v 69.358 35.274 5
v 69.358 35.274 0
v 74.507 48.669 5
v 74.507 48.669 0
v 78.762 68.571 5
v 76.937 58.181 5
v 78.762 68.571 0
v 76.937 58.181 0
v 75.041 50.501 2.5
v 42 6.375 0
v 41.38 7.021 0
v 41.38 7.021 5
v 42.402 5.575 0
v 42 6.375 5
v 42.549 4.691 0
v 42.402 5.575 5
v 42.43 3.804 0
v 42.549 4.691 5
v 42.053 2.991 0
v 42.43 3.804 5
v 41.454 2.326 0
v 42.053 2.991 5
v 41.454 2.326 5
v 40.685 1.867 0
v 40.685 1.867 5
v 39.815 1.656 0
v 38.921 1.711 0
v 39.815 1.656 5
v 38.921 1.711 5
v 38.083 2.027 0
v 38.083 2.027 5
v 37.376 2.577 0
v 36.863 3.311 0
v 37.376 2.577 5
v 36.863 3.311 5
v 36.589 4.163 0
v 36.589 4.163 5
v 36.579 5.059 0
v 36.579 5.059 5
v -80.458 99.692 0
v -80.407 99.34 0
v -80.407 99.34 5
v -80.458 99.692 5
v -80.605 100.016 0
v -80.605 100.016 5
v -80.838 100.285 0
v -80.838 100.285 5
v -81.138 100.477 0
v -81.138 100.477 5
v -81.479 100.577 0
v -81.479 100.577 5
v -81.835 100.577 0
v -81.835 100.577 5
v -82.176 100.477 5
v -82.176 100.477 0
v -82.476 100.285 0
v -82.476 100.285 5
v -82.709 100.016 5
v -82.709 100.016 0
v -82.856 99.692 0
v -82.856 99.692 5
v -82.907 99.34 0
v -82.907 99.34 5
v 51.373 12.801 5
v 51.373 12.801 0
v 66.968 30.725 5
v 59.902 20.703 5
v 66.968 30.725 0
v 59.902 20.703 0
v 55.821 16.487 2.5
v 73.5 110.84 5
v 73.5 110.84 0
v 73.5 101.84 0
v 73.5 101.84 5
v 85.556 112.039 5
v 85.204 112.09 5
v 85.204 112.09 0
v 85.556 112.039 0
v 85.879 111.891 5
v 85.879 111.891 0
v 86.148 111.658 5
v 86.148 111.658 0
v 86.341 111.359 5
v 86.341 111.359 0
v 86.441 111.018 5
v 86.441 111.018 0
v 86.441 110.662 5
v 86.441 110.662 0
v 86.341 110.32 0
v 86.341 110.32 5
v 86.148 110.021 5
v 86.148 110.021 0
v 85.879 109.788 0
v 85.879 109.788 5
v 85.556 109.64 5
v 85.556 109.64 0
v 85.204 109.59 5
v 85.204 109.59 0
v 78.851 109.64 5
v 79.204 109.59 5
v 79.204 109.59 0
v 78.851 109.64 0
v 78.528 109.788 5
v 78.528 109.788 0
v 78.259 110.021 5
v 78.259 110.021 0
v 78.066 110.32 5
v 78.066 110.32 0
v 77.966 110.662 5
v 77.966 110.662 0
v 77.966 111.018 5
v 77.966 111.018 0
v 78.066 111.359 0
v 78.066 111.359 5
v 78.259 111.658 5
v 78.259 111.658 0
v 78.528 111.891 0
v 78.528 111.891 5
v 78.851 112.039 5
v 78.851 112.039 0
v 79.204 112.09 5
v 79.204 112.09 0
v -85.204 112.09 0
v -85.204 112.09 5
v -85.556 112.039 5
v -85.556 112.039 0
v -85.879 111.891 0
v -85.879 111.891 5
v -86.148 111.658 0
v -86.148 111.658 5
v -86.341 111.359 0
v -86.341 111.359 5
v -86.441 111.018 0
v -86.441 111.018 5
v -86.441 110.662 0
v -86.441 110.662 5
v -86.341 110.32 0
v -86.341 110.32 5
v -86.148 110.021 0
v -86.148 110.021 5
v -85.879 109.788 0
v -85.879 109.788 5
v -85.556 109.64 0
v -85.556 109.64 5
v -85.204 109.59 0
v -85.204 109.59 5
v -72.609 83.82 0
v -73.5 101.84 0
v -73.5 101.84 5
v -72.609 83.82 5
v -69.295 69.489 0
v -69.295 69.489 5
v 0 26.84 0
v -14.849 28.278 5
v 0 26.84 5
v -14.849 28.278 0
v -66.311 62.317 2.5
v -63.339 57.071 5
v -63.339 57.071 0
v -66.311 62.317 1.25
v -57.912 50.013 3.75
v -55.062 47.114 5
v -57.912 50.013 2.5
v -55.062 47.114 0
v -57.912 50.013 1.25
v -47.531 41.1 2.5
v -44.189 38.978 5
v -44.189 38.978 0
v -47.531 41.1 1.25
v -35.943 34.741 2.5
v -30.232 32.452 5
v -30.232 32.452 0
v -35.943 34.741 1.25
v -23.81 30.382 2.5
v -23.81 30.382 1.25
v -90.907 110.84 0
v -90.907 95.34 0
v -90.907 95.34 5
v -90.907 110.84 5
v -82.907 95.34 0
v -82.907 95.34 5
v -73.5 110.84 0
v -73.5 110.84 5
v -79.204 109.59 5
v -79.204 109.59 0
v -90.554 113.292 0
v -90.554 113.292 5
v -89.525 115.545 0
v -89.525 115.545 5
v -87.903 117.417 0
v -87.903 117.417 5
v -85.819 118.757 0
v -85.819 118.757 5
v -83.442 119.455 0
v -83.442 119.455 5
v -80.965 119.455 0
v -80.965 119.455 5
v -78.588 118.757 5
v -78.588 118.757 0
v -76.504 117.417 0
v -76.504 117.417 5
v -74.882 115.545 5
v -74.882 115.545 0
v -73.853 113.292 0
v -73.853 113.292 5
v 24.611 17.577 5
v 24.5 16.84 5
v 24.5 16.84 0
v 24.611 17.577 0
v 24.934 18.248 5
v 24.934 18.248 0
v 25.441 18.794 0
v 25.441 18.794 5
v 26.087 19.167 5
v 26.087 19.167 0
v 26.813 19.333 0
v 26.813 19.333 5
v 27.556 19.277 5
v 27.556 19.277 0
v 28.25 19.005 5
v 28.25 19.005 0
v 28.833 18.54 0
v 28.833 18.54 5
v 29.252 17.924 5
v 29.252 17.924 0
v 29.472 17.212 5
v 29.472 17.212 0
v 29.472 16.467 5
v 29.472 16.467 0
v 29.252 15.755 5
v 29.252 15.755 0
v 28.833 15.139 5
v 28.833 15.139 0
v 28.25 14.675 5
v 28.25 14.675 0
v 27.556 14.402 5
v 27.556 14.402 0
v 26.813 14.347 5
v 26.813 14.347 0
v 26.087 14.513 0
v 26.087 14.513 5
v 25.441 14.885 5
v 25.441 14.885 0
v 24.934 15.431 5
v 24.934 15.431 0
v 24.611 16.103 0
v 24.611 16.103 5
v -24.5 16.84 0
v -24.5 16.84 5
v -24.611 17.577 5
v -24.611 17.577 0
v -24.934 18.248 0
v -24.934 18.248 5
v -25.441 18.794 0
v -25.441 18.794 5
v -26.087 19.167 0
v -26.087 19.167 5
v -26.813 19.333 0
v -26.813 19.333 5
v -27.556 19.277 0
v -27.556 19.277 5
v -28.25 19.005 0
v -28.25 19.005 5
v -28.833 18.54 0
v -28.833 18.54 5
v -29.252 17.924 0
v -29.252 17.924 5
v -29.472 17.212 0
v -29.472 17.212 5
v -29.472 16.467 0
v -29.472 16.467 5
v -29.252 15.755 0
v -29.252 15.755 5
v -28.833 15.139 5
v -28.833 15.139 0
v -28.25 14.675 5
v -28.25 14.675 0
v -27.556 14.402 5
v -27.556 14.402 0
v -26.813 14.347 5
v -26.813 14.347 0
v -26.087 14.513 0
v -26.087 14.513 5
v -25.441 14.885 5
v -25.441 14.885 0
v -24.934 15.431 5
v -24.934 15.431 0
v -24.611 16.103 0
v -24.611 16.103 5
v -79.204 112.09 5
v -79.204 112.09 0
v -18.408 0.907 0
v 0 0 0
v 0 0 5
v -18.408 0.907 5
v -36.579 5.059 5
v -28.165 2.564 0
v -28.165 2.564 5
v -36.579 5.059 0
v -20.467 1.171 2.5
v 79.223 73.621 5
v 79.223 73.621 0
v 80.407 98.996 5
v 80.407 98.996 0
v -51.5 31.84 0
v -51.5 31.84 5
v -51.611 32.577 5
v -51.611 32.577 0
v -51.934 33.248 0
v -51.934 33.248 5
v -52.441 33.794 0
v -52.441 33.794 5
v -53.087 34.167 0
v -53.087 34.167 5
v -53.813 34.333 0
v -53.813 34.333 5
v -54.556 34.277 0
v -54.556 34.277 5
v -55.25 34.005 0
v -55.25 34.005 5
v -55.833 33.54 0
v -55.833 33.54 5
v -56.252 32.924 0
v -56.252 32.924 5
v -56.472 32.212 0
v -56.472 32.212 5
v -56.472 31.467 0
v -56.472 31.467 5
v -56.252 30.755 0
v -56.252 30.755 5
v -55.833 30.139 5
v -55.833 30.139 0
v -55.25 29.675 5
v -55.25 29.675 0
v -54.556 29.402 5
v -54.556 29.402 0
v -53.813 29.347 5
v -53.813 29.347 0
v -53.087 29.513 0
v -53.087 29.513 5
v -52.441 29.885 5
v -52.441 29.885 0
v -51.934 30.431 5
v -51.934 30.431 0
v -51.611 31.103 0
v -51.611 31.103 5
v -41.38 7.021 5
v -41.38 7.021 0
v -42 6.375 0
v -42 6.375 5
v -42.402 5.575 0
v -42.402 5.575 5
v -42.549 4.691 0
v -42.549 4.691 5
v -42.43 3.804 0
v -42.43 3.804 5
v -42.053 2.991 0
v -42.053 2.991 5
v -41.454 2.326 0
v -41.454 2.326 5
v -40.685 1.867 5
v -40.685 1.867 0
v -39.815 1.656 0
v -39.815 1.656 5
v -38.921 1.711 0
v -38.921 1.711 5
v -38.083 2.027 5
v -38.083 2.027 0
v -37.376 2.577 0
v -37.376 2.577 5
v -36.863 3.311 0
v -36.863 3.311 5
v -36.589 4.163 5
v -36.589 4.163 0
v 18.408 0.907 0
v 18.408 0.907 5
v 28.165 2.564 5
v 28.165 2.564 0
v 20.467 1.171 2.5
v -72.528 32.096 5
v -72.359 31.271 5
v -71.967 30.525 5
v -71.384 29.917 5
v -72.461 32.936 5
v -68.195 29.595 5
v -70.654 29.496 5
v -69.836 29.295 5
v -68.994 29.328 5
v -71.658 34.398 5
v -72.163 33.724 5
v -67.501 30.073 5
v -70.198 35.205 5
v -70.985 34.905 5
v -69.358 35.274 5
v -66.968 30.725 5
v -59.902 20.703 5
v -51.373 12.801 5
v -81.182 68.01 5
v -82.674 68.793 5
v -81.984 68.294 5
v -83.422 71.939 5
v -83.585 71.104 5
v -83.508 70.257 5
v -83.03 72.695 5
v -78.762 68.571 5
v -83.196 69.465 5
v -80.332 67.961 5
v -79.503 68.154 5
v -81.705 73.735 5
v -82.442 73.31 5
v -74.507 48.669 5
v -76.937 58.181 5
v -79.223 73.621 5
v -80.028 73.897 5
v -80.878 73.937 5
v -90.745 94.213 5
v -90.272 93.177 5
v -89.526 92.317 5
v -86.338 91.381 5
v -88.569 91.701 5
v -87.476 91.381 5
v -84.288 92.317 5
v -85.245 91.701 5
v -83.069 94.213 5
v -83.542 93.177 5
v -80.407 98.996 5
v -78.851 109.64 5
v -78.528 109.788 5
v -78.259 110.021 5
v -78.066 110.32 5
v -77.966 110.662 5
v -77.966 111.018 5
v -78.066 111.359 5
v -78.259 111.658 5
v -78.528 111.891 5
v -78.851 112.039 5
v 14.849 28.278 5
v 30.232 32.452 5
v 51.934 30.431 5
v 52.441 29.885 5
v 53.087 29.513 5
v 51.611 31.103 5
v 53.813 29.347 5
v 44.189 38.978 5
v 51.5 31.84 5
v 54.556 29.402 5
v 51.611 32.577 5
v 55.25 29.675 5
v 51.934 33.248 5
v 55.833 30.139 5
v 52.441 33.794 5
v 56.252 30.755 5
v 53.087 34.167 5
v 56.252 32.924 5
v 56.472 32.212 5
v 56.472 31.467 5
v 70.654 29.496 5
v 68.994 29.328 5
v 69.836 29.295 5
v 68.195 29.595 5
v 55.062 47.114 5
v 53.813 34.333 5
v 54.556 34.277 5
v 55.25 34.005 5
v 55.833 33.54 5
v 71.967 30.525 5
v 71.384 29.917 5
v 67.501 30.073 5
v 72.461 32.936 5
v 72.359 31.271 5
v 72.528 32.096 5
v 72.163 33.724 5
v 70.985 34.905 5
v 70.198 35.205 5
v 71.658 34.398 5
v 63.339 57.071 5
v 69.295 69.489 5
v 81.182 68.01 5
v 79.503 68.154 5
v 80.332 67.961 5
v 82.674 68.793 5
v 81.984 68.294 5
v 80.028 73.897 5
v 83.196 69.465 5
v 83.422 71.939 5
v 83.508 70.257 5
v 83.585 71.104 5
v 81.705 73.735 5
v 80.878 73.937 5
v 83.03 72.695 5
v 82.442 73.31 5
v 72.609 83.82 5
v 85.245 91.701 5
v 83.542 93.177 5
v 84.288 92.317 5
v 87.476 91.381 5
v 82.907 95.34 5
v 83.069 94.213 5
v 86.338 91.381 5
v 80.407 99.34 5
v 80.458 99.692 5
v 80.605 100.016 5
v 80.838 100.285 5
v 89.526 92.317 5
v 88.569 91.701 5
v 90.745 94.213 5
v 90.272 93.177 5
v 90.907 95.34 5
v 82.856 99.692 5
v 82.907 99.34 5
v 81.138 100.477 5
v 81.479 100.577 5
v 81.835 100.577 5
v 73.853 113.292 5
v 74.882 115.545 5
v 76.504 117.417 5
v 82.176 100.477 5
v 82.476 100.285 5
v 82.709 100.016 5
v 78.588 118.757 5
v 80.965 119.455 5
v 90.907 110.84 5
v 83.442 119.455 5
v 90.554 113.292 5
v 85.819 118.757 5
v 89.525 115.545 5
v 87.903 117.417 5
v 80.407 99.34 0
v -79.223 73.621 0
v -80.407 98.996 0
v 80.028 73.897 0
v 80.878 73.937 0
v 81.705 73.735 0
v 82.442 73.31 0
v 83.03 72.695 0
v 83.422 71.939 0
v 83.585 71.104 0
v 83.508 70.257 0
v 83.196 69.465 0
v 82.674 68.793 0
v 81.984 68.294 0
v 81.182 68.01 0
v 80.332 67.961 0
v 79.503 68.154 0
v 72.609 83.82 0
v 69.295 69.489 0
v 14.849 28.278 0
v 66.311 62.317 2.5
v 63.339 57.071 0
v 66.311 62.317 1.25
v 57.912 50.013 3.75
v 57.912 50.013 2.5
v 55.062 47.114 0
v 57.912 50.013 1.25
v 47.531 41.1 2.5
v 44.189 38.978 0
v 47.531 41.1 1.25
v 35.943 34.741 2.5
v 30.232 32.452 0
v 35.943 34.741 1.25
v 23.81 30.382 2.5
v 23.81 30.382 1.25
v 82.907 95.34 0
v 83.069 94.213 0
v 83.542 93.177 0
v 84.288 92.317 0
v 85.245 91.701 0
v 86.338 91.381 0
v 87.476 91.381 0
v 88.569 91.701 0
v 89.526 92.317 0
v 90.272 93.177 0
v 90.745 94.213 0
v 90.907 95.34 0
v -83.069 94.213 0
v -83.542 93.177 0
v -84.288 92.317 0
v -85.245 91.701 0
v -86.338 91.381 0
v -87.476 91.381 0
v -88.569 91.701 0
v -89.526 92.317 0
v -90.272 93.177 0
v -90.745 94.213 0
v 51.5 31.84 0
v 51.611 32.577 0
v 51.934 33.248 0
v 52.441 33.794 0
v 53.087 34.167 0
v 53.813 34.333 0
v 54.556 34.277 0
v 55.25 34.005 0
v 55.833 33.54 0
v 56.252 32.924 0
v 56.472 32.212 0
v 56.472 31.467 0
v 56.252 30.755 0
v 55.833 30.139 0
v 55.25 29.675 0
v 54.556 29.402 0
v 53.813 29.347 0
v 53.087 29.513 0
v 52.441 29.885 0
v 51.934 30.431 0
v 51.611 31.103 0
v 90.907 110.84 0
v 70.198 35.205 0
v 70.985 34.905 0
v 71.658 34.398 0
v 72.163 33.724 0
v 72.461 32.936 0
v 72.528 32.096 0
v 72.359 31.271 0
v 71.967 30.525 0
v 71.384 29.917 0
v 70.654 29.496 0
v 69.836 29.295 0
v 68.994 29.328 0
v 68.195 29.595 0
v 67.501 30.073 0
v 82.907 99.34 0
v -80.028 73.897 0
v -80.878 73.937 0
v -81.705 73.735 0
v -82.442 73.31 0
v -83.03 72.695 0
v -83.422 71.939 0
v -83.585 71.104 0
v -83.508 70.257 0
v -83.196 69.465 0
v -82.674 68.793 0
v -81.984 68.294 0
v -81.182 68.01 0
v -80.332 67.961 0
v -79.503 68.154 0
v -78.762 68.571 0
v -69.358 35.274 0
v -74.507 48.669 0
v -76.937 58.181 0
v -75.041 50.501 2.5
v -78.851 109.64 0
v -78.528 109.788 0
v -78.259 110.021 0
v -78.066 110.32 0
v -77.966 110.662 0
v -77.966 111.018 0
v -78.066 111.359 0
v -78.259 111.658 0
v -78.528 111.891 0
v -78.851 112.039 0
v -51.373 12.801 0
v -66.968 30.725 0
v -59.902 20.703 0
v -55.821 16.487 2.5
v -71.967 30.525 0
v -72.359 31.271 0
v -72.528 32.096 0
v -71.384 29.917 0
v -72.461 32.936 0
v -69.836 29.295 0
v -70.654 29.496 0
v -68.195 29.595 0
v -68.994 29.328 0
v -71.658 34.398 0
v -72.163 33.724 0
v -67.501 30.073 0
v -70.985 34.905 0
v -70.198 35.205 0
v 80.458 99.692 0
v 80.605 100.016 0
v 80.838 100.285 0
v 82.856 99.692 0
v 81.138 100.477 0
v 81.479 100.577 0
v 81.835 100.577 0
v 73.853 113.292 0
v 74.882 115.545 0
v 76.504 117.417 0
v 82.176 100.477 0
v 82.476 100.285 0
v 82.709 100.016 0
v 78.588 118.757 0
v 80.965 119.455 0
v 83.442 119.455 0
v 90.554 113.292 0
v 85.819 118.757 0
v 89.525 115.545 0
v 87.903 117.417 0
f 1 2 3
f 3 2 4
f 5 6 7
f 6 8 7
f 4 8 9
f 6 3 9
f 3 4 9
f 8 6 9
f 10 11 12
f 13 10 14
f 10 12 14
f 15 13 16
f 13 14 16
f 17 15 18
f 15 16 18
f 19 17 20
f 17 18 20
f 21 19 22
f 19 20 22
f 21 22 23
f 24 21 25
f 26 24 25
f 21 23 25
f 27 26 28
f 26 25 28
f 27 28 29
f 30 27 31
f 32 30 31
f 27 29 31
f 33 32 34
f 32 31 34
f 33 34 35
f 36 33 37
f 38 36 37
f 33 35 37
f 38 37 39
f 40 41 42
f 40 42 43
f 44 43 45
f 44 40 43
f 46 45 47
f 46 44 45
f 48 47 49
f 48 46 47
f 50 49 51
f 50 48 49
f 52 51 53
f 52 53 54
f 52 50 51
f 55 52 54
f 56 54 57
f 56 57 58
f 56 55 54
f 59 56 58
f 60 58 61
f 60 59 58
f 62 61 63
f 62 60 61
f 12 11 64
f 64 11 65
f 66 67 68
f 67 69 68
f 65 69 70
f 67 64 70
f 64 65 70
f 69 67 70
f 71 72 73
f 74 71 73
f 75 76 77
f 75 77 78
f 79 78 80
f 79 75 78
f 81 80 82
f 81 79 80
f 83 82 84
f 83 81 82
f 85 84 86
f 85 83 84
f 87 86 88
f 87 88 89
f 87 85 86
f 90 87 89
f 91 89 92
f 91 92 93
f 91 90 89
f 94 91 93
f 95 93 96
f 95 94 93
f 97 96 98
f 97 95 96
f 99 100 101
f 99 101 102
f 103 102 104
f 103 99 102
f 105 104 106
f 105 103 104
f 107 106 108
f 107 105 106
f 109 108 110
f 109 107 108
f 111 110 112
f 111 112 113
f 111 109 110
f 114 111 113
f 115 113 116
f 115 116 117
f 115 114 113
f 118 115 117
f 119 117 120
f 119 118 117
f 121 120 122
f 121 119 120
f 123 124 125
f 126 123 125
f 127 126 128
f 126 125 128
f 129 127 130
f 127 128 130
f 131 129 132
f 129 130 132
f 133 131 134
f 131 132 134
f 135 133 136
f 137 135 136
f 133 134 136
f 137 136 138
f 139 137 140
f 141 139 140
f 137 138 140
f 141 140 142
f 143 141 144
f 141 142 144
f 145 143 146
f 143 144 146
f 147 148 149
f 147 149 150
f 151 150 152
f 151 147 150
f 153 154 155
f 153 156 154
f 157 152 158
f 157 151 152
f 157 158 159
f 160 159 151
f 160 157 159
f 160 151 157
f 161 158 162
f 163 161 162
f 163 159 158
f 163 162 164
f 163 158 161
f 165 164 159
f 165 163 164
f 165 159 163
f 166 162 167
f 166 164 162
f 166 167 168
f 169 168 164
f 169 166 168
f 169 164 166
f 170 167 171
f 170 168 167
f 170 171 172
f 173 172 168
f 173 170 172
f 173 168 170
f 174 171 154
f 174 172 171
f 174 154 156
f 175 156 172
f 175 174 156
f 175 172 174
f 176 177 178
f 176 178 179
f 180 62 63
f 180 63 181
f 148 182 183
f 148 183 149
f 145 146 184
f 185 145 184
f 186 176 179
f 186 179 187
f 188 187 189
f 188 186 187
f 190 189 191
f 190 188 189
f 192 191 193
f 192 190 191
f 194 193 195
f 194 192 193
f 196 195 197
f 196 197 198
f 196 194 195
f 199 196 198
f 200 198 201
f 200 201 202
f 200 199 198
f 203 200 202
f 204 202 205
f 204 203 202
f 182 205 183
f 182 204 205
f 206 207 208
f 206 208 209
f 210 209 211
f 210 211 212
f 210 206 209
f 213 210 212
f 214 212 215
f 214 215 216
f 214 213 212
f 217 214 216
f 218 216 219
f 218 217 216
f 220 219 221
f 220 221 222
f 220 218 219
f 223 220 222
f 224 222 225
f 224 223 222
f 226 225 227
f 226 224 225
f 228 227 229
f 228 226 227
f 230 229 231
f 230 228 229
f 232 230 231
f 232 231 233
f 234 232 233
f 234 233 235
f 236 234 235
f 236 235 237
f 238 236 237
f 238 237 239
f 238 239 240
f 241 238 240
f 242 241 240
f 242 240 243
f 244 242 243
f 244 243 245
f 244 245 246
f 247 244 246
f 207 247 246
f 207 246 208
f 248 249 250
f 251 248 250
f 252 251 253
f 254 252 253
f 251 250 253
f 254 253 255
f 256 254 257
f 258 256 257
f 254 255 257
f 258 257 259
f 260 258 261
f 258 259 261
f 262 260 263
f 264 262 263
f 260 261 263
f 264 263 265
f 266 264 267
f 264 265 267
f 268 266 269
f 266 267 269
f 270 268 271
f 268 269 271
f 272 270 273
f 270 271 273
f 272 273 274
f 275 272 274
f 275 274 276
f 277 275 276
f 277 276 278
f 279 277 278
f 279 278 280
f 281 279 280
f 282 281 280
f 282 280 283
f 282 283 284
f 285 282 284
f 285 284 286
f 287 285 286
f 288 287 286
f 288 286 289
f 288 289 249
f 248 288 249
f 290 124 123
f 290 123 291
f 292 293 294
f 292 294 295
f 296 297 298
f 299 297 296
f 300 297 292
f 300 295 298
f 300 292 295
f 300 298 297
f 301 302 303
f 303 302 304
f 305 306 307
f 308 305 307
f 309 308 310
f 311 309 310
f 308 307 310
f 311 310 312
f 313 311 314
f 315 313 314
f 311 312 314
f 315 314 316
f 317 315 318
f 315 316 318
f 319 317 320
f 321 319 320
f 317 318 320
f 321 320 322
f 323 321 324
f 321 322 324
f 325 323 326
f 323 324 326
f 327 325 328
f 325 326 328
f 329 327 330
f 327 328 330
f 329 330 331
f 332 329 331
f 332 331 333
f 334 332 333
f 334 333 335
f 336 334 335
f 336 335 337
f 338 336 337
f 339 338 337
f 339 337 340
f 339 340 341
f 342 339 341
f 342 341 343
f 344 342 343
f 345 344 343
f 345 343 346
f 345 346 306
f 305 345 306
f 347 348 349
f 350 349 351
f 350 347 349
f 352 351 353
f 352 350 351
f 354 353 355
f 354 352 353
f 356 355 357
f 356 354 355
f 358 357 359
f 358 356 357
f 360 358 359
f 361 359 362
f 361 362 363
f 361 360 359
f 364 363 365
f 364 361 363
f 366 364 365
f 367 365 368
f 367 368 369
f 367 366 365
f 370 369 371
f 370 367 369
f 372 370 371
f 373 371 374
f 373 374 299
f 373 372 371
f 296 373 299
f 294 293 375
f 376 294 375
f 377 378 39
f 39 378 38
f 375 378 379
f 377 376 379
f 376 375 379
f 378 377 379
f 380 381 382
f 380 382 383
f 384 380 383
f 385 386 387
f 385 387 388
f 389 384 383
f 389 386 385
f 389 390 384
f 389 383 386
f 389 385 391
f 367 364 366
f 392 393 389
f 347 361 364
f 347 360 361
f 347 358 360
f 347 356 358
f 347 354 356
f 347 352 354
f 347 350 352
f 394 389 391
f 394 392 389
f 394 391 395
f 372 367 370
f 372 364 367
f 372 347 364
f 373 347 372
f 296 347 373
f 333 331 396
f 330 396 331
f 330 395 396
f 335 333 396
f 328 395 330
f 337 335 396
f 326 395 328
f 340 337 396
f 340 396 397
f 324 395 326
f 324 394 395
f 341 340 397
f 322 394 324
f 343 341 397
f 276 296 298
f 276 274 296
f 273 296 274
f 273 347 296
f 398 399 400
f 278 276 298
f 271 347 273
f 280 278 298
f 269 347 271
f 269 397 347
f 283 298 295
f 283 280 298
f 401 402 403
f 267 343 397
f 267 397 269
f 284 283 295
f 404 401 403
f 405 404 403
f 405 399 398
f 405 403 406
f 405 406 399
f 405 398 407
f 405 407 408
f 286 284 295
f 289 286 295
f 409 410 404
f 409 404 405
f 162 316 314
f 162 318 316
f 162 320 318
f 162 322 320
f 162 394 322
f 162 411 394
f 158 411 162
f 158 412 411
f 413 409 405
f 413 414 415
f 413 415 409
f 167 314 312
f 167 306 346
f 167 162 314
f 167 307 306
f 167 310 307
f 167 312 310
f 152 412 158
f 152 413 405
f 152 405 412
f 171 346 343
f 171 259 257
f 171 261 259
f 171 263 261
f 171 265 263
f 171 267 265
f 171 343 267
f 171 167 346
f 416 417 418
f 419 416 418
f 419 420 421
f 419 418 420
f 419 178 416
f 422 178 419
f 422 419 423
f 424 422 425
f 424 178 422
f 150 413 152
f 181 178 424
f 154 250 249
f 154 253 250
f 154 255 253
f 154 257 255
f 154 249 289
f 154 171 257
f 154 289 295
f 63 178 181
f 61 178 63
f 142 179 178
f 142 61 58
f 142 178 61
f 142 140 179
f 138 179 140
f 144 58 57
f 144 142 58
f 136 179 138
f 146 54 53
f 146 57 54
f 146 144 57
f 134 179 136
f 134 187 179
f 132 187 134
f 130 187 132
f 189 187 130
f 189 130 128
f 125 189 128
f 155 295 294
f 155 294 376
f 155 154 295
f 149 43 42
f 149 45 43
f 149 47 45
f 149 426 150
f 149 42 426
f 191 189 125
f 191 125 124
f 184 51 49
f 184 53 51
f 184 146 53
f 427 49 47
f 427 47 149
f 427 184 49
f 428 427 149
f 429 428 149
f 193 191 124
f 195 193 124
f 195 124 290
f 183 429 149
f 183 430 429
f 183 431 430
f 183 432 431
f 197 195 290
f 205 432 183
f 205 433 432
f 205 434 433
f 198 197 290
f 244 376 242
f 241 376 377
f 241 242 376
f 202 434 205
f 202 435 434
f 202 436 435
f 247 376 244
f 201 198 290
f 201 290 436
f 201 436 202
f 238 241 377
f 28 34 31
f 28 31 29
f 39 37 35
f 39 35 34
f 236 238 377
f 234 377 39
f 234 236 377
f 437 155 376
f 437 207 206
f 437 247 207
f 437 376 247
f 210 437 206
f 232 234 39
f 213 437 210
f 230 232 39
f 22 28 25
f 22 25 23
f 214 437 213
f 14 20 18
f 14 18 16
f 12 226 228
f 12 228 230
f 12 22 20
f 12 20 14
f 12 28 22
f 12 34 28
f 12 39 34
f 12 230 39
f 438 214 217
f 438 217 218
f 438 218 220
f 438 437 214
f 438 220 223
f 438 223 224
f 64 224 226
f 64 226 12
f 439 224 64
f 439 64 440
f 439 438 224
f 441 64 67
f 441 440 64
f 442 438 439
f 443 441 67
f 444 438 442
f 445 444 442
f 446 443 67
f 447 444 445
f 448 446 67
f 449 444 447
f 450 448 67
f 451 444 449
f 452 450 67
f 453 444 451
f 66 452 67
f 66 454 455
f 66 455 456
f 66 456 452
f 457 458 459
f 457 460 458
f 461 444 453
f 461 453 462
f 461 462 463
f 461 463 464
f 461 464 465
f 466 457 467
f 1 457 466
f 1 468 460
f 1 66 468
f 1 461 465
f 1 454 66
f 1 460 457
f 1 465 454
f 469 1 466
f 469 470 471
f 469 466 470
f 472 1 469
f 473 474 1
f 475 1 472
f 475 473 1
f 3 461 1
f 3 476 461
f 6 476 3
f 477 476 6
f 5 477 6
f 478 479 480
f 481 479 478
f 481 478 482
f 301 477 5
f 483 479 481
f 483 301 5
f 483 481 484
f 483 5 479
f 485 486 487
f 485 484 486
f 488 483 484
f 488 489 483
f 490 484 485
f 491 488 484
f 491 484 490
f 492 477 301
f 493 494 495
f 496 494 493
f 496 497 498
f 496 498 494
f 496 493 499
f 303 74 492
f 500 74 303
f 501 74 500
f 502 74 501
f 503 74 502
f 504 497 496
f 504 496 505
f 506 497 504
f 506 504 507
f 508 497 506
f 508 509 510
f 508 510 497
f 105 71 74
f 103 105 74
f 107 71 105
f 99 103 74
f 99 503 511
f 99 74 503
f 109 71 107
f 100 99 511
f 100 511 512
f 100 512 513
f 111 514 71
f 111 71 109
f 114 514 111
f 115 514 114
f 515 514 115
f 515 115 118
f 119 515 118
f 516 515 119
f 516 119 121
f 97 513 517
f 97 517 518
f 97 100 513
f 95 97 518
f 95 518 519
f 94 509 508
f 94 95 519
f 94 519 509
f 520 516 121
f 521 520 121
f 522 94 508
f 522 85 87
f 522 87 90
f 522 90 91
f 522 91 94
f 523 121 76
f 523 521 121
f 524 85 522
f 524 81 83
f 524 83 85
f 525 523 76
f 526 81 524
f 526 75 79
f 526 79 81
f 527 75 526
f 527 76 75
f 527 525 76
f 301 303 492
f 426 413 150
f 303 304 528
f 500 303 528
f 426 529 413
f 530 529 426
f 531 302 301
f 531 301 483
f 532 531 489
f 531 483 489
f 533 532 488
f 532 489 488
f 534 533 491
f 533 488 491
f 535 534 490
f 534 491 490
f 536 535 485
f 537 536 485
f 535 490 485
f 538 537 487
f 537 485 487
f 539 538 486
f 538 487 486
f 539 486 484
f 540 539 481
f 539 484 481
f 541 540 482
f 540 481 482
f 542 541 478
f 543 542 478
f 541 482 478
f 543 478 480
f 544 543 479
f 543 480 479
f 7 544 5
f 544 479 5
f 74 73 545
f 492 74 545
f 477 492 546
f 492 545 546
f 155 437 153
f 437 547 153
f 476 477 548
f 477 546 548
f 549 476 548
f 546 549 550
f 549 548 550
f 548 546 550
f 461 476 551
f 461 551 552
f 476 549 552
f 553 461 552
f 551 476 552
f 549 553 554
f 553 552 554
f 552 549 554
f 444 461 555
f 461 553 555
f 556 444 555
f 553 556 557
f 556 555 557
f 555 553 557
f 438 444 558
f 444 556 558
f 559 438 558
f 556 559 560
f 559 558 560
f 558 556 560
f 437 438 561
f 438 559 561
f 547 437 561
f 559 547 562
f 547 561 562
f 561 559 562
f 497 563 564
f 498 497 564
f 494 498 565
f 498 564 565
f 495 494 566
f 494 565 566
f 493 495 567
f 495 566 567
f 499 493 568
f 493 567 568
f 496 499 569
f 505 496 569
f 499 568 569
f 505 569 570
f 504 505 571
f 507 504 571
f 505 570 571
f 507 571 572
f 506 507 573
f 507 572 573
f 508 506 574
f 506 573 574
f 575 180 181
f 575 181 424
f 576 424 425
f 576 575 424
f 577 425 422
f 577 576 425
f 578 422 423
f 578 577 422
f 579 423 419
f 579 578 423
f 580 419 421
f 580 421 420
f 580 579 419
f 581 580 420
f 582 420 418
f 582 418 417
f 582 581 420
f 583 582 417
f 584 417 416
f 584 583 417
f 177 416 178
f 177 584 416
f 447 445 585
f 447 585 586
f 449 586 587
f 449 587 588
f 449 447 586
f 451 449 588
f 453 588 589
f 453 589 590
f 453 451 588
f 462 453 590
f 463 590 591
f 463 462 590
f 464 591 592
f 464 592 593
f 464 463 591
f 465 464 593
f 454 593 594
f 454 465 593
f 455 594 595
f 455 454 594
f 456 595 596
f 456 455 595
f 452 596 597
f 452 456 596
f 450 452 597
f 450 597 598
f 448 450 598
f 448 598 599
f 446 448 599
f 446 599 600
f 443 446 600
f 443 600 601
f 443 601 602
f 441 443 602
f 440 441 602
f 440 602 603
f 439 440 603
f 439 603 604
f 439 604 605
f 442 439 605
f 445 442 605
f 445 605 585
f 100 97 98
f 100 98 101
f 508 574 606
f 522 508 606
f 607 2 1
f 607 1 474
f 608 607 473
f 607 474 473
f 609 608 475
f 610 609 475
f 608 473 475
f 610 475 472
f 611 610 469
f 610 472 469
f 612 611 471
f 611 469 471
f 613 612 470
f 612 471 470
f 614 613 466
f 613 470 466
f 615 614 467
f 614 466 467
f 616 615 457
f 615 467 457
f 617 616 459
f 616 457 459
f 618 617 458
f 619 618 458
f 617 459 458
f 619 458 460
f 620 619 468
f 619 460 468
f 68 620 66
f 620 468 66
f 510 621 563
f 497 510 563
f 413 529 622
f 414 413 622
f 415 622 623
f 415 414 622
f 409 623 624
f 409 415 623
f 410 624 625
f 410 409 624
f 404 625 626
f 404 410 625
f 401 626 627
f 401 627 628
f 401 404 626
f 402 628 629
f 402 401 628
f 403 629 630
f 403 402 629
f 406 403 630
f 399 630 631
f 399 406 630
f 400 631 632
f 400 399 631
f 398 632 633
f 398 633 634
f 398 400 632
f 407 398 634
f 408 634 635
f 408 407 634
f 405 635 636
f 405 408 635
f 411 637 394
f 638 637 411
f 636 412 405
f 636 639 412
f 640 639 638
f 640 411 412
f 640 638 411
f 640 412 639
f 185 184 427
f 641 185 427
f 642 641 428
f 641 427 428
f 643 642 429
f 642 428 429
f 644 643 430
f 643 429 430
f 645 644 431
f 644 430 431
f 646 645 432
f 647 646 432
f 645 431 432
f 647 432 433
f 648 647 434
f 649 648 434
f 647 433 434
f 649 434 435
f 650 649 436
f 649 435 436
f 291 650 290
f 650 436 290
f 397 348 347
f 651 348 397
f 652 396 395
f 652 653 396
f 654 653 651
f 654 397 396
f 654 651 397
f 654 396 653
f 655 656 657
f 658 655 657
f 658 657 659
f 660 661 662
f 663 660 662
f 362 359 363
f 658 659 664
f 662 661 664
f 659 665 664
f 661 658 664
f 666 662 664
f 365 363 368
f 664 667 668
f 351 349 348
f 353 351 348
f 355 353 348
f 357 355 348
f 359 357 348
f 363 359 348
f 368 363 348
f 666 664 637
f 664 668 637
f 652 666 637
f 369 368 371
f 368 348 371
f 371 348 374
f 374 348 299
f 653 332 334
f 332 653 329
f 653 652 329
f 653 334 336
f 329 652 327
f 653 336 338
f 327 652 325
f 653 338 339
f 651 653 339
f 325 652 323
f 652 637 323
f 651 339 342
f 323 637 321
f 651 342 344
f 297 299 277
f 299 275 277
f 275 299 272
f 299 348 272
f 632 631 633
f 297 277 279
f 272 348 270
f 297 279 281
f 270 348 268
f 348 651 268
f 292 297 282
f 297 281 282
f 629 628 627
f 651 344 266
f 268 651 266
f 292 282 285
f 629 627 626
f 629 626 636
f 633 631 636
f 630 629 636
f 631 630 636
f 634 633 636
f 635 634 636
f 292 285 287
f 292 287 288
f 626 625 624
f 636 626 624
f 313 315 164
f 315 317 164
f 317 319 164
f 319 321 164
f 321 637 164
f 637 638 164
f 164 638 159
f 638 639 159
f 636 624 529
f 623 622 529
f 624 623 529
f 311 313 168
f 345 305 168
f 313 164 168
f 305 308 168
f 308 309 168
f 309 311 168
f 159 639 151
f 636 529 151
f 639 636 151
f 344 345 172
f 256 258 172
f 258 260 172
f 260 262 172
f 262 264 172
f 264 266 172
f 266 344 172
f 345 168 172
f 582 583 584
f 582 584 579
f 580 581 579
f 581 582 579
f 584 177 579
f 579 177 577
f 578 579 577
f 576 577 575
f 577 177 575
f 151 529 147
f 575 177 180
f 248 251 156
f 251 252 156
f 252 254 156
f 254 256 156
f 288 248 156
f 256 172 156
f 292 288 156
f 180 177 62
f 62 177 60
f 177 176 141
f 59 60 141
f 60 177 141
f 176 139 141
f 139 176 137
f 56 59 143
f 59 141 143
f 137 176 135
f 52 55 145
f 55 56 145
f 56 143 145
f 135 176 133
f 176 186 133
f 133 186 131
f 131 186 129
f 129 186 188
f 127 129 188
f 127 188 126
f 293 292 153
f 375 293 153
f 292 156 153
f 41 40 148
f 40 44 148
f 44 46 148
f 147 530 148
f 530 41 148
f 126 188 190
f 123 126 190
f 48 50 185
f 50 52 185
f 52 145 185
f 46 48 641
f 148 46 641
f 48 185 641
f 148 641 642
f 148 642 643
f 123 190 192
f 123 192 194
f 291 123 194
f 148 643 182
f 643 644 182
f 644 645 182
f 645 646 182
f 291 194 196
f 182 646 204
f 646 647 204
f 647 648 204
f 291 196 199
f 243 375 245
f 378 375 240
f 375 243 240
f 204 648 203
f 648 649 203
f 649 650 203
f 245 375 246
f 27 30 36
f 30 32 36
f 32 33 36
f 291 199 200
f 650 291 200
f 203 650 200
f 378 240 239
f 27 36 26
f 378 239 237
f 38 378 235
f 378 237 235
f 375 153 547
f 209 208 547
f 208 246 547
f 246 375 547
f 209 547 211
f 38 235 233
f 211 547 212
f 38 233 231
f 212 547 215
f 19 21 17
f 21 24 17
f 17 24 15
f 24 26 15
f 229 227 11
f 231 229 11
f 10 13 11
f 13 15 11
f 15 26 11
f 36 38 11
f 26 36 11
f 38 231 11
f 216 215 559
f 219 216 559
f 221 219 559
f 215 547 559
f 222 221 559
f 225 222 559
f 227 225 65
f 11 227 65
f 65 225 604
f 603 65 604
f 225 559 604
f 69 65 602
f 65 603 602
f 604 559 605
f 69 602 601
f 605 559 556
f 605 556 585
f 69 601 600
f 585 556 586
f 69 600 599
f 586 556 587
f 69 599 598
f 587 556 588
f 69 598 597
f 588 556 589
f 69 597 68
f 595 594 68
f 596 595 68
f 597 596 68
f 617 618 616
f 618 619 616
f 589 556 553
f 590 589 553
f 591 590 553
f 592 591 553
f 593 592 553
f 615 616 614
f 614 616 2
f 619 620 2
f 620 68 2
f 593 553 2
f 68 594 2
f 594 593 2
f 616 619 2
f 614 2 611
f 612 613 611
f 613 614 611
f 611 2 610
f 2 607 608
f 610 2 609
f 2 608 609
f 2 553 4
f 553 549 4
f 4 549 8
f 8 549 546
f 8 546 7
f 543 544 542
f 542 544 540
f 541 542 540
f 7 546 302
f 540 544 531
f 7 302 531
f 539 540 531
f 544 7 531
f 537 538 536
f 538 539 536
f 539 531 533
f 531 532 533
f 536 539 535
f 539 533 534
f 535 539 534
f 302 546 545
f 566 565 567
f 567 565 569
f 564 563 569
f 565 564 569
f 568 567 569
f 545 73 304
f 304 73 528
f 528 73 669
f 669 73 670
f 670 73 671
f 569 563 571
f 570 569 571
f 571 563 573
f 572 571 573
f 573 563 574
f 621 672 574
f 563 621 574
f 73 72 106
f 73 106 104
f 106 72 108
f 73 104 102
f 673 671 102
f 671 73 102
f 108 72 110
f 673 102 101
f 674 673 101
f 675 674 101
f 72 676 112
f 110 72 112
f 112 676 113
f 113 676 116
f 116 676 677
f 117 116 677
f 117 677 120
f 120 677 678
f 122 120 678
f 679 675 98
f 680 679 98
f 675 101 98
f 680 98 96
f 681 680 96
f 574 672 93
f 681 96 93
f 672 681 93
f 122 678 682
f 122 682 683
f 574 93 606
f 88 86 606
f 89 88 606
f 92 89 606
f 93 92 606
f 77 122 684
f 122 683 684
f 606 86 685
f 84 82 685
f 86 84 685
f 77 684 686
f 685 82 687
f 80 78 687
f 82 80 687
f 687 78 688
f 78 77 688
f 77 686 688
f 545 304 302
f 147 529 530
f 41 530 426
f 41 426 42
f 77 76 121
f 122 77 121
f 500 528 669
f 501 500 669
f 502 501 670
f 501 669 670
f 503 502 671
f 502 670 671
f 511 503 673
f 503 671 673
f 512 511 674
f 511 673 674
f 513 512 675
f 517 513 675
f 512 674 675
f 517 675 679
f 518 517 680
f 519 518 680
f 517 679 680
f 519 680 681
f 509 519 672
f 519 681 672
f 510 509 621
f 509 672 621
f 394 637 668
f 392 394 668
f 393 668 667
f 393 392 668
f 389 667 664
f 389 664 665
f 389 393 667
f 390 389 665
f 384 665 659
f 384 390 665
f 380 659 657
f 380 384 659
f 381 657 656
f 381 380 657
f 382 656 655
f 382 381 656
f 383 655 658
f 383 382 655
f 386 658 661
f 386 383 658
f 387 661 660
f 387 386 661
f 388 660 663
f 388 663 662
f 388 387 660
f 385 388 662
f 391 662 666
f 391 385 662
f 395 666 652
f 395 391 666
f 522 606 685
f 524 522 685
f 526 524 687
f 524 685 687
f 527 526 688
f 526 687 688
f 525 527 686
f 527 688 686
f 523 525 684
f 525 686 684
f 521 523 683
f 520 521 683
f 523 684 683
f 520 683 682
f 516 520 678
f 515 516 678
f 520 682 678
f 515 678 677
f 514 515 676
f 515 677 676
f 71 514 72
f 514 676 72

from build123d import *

# Parameters (mm, degrees)
PAD_DEPTH       = 5
POCKET_DEPTH    = 5.001
SKETCH137_R     = 3
PAD001_DEPTH    = 5
SKETCH_R        = 2.5
POCKET001_DEPTH = 5.001


with BuildPart() as body:
    # Sketch135 → Pad (new body)
    with BuildSketch(Plane.XY):
        with BuildLine():
            add(Edge.make_bspline(
                [(-73.5, 101.839707), (-74.771, 49.44), (-49.529, 37.339707), (-22.686, 26.780106), (0, 26.839707)],
                knots=[0, 0, 0, 0, 0, 1, 1, 1, 1, 1], degree=4))
            Line((0, 26.839707), (0, 0))
            add(Edge.make_bspline(
                [(0, 0), (-24.669, -0.204), (-39, 6.04)],
                knots=[0, 0, 0, 1, 1, 1], degree=2))
            add(Edge.make_bspline(
                [(-39, 6.04), (-72.6, 18.986), (-79.11, 71.198)],
                knots=[0, 0, 0, 1, 1, 1], degree=2))
            add(Edge.make_bspline(
                [(-79.11, 71.198), (-80.407, 98.996)],
                knots=[0, 0, 1, 1], degree=1))
            Line((-80.407, 98.996), (-80.407, 99.34))
            ThreePointArc((-80.407, 99.34), (-81.657, 100.59), (-82.907, 99.34))
            Line((-82.907, 99.34), (-82.907, 95.34))
            ThreePointArc((-82.907, 95.34), (-86.907, 91.34), (-90.907, 95.34))
            Line((-90.907, 95.34), (-90.907, 110.839707))
            ThreePointArc((-90.907, 110.839707), (-82.2035, 119.543207), (-73.5, 110.839707))
            Line((-73.5, 110.839707), (-73.5, 101.839707))
        make_face()
    extrude(amount=PAD_DEPTH)

    # Sketch136 (on Face14 of Pad) → Pocket (cut, through all)
    with BuildSketch(Plane.XY.offset(5)):
        with BuildLine():
            ThreePointArc((-85.2035, 112.089707), (-86.4535, 110.839707), (-85.2035, 109.589707))
            Line((-85.2035, 109.589707), (-79.2035, 109.589707))
            ThreePointArc((-79.2035, 109.589707), (-77.9535, 110.839707), (-79.2035, 112.089707))
            Line((-85.2035, 112.089707), (-79.2035, 112.089707))
        make_face()
    extrude(amount=-POCKET_DEPTH, mode=Mode.SUBTRACT)

    # Sketch137 (on Face5 of Pocket) → Pad001 (join)
    with BuildSketch(Plane.XY.offset(5)):
        with Locations((-39.549752, 4.644374)):
            Circle(SKETCH137_R)
        with Locations((-80.589428, 70.950429)):
            Circle(SKETCH137_R)
        with Locations((-69.533947, 32.279444)):
            Circle(SKETCH137_R)
    extrude(amount=-PAD001_DEPTH)

    # Sketch (on Face23 of Pad001) → Pocket001 (cut, through all)
    with BuildSketch(Plane.XY.offset(5)):
        with Locations((-27, 16.839707)):
            Circle(SKETCH_R)
        with Locations((-54, 31.839707)):
            Circle(SKETCH_R)
    extrude(amount=-POCKET001_DEPTH, mode=Mode.SUBTRACT)


with BuildPart() as fusion:
    # Part__Mirroring: instance of Body
    add(body.part.mirror(Plane(origin=(0, 0, 0), x_dir=(0, -1, 0), z_dir=(1, 0, 0))))

    # Fusion: union Body
    add(body.part)


solid = fusion.part
